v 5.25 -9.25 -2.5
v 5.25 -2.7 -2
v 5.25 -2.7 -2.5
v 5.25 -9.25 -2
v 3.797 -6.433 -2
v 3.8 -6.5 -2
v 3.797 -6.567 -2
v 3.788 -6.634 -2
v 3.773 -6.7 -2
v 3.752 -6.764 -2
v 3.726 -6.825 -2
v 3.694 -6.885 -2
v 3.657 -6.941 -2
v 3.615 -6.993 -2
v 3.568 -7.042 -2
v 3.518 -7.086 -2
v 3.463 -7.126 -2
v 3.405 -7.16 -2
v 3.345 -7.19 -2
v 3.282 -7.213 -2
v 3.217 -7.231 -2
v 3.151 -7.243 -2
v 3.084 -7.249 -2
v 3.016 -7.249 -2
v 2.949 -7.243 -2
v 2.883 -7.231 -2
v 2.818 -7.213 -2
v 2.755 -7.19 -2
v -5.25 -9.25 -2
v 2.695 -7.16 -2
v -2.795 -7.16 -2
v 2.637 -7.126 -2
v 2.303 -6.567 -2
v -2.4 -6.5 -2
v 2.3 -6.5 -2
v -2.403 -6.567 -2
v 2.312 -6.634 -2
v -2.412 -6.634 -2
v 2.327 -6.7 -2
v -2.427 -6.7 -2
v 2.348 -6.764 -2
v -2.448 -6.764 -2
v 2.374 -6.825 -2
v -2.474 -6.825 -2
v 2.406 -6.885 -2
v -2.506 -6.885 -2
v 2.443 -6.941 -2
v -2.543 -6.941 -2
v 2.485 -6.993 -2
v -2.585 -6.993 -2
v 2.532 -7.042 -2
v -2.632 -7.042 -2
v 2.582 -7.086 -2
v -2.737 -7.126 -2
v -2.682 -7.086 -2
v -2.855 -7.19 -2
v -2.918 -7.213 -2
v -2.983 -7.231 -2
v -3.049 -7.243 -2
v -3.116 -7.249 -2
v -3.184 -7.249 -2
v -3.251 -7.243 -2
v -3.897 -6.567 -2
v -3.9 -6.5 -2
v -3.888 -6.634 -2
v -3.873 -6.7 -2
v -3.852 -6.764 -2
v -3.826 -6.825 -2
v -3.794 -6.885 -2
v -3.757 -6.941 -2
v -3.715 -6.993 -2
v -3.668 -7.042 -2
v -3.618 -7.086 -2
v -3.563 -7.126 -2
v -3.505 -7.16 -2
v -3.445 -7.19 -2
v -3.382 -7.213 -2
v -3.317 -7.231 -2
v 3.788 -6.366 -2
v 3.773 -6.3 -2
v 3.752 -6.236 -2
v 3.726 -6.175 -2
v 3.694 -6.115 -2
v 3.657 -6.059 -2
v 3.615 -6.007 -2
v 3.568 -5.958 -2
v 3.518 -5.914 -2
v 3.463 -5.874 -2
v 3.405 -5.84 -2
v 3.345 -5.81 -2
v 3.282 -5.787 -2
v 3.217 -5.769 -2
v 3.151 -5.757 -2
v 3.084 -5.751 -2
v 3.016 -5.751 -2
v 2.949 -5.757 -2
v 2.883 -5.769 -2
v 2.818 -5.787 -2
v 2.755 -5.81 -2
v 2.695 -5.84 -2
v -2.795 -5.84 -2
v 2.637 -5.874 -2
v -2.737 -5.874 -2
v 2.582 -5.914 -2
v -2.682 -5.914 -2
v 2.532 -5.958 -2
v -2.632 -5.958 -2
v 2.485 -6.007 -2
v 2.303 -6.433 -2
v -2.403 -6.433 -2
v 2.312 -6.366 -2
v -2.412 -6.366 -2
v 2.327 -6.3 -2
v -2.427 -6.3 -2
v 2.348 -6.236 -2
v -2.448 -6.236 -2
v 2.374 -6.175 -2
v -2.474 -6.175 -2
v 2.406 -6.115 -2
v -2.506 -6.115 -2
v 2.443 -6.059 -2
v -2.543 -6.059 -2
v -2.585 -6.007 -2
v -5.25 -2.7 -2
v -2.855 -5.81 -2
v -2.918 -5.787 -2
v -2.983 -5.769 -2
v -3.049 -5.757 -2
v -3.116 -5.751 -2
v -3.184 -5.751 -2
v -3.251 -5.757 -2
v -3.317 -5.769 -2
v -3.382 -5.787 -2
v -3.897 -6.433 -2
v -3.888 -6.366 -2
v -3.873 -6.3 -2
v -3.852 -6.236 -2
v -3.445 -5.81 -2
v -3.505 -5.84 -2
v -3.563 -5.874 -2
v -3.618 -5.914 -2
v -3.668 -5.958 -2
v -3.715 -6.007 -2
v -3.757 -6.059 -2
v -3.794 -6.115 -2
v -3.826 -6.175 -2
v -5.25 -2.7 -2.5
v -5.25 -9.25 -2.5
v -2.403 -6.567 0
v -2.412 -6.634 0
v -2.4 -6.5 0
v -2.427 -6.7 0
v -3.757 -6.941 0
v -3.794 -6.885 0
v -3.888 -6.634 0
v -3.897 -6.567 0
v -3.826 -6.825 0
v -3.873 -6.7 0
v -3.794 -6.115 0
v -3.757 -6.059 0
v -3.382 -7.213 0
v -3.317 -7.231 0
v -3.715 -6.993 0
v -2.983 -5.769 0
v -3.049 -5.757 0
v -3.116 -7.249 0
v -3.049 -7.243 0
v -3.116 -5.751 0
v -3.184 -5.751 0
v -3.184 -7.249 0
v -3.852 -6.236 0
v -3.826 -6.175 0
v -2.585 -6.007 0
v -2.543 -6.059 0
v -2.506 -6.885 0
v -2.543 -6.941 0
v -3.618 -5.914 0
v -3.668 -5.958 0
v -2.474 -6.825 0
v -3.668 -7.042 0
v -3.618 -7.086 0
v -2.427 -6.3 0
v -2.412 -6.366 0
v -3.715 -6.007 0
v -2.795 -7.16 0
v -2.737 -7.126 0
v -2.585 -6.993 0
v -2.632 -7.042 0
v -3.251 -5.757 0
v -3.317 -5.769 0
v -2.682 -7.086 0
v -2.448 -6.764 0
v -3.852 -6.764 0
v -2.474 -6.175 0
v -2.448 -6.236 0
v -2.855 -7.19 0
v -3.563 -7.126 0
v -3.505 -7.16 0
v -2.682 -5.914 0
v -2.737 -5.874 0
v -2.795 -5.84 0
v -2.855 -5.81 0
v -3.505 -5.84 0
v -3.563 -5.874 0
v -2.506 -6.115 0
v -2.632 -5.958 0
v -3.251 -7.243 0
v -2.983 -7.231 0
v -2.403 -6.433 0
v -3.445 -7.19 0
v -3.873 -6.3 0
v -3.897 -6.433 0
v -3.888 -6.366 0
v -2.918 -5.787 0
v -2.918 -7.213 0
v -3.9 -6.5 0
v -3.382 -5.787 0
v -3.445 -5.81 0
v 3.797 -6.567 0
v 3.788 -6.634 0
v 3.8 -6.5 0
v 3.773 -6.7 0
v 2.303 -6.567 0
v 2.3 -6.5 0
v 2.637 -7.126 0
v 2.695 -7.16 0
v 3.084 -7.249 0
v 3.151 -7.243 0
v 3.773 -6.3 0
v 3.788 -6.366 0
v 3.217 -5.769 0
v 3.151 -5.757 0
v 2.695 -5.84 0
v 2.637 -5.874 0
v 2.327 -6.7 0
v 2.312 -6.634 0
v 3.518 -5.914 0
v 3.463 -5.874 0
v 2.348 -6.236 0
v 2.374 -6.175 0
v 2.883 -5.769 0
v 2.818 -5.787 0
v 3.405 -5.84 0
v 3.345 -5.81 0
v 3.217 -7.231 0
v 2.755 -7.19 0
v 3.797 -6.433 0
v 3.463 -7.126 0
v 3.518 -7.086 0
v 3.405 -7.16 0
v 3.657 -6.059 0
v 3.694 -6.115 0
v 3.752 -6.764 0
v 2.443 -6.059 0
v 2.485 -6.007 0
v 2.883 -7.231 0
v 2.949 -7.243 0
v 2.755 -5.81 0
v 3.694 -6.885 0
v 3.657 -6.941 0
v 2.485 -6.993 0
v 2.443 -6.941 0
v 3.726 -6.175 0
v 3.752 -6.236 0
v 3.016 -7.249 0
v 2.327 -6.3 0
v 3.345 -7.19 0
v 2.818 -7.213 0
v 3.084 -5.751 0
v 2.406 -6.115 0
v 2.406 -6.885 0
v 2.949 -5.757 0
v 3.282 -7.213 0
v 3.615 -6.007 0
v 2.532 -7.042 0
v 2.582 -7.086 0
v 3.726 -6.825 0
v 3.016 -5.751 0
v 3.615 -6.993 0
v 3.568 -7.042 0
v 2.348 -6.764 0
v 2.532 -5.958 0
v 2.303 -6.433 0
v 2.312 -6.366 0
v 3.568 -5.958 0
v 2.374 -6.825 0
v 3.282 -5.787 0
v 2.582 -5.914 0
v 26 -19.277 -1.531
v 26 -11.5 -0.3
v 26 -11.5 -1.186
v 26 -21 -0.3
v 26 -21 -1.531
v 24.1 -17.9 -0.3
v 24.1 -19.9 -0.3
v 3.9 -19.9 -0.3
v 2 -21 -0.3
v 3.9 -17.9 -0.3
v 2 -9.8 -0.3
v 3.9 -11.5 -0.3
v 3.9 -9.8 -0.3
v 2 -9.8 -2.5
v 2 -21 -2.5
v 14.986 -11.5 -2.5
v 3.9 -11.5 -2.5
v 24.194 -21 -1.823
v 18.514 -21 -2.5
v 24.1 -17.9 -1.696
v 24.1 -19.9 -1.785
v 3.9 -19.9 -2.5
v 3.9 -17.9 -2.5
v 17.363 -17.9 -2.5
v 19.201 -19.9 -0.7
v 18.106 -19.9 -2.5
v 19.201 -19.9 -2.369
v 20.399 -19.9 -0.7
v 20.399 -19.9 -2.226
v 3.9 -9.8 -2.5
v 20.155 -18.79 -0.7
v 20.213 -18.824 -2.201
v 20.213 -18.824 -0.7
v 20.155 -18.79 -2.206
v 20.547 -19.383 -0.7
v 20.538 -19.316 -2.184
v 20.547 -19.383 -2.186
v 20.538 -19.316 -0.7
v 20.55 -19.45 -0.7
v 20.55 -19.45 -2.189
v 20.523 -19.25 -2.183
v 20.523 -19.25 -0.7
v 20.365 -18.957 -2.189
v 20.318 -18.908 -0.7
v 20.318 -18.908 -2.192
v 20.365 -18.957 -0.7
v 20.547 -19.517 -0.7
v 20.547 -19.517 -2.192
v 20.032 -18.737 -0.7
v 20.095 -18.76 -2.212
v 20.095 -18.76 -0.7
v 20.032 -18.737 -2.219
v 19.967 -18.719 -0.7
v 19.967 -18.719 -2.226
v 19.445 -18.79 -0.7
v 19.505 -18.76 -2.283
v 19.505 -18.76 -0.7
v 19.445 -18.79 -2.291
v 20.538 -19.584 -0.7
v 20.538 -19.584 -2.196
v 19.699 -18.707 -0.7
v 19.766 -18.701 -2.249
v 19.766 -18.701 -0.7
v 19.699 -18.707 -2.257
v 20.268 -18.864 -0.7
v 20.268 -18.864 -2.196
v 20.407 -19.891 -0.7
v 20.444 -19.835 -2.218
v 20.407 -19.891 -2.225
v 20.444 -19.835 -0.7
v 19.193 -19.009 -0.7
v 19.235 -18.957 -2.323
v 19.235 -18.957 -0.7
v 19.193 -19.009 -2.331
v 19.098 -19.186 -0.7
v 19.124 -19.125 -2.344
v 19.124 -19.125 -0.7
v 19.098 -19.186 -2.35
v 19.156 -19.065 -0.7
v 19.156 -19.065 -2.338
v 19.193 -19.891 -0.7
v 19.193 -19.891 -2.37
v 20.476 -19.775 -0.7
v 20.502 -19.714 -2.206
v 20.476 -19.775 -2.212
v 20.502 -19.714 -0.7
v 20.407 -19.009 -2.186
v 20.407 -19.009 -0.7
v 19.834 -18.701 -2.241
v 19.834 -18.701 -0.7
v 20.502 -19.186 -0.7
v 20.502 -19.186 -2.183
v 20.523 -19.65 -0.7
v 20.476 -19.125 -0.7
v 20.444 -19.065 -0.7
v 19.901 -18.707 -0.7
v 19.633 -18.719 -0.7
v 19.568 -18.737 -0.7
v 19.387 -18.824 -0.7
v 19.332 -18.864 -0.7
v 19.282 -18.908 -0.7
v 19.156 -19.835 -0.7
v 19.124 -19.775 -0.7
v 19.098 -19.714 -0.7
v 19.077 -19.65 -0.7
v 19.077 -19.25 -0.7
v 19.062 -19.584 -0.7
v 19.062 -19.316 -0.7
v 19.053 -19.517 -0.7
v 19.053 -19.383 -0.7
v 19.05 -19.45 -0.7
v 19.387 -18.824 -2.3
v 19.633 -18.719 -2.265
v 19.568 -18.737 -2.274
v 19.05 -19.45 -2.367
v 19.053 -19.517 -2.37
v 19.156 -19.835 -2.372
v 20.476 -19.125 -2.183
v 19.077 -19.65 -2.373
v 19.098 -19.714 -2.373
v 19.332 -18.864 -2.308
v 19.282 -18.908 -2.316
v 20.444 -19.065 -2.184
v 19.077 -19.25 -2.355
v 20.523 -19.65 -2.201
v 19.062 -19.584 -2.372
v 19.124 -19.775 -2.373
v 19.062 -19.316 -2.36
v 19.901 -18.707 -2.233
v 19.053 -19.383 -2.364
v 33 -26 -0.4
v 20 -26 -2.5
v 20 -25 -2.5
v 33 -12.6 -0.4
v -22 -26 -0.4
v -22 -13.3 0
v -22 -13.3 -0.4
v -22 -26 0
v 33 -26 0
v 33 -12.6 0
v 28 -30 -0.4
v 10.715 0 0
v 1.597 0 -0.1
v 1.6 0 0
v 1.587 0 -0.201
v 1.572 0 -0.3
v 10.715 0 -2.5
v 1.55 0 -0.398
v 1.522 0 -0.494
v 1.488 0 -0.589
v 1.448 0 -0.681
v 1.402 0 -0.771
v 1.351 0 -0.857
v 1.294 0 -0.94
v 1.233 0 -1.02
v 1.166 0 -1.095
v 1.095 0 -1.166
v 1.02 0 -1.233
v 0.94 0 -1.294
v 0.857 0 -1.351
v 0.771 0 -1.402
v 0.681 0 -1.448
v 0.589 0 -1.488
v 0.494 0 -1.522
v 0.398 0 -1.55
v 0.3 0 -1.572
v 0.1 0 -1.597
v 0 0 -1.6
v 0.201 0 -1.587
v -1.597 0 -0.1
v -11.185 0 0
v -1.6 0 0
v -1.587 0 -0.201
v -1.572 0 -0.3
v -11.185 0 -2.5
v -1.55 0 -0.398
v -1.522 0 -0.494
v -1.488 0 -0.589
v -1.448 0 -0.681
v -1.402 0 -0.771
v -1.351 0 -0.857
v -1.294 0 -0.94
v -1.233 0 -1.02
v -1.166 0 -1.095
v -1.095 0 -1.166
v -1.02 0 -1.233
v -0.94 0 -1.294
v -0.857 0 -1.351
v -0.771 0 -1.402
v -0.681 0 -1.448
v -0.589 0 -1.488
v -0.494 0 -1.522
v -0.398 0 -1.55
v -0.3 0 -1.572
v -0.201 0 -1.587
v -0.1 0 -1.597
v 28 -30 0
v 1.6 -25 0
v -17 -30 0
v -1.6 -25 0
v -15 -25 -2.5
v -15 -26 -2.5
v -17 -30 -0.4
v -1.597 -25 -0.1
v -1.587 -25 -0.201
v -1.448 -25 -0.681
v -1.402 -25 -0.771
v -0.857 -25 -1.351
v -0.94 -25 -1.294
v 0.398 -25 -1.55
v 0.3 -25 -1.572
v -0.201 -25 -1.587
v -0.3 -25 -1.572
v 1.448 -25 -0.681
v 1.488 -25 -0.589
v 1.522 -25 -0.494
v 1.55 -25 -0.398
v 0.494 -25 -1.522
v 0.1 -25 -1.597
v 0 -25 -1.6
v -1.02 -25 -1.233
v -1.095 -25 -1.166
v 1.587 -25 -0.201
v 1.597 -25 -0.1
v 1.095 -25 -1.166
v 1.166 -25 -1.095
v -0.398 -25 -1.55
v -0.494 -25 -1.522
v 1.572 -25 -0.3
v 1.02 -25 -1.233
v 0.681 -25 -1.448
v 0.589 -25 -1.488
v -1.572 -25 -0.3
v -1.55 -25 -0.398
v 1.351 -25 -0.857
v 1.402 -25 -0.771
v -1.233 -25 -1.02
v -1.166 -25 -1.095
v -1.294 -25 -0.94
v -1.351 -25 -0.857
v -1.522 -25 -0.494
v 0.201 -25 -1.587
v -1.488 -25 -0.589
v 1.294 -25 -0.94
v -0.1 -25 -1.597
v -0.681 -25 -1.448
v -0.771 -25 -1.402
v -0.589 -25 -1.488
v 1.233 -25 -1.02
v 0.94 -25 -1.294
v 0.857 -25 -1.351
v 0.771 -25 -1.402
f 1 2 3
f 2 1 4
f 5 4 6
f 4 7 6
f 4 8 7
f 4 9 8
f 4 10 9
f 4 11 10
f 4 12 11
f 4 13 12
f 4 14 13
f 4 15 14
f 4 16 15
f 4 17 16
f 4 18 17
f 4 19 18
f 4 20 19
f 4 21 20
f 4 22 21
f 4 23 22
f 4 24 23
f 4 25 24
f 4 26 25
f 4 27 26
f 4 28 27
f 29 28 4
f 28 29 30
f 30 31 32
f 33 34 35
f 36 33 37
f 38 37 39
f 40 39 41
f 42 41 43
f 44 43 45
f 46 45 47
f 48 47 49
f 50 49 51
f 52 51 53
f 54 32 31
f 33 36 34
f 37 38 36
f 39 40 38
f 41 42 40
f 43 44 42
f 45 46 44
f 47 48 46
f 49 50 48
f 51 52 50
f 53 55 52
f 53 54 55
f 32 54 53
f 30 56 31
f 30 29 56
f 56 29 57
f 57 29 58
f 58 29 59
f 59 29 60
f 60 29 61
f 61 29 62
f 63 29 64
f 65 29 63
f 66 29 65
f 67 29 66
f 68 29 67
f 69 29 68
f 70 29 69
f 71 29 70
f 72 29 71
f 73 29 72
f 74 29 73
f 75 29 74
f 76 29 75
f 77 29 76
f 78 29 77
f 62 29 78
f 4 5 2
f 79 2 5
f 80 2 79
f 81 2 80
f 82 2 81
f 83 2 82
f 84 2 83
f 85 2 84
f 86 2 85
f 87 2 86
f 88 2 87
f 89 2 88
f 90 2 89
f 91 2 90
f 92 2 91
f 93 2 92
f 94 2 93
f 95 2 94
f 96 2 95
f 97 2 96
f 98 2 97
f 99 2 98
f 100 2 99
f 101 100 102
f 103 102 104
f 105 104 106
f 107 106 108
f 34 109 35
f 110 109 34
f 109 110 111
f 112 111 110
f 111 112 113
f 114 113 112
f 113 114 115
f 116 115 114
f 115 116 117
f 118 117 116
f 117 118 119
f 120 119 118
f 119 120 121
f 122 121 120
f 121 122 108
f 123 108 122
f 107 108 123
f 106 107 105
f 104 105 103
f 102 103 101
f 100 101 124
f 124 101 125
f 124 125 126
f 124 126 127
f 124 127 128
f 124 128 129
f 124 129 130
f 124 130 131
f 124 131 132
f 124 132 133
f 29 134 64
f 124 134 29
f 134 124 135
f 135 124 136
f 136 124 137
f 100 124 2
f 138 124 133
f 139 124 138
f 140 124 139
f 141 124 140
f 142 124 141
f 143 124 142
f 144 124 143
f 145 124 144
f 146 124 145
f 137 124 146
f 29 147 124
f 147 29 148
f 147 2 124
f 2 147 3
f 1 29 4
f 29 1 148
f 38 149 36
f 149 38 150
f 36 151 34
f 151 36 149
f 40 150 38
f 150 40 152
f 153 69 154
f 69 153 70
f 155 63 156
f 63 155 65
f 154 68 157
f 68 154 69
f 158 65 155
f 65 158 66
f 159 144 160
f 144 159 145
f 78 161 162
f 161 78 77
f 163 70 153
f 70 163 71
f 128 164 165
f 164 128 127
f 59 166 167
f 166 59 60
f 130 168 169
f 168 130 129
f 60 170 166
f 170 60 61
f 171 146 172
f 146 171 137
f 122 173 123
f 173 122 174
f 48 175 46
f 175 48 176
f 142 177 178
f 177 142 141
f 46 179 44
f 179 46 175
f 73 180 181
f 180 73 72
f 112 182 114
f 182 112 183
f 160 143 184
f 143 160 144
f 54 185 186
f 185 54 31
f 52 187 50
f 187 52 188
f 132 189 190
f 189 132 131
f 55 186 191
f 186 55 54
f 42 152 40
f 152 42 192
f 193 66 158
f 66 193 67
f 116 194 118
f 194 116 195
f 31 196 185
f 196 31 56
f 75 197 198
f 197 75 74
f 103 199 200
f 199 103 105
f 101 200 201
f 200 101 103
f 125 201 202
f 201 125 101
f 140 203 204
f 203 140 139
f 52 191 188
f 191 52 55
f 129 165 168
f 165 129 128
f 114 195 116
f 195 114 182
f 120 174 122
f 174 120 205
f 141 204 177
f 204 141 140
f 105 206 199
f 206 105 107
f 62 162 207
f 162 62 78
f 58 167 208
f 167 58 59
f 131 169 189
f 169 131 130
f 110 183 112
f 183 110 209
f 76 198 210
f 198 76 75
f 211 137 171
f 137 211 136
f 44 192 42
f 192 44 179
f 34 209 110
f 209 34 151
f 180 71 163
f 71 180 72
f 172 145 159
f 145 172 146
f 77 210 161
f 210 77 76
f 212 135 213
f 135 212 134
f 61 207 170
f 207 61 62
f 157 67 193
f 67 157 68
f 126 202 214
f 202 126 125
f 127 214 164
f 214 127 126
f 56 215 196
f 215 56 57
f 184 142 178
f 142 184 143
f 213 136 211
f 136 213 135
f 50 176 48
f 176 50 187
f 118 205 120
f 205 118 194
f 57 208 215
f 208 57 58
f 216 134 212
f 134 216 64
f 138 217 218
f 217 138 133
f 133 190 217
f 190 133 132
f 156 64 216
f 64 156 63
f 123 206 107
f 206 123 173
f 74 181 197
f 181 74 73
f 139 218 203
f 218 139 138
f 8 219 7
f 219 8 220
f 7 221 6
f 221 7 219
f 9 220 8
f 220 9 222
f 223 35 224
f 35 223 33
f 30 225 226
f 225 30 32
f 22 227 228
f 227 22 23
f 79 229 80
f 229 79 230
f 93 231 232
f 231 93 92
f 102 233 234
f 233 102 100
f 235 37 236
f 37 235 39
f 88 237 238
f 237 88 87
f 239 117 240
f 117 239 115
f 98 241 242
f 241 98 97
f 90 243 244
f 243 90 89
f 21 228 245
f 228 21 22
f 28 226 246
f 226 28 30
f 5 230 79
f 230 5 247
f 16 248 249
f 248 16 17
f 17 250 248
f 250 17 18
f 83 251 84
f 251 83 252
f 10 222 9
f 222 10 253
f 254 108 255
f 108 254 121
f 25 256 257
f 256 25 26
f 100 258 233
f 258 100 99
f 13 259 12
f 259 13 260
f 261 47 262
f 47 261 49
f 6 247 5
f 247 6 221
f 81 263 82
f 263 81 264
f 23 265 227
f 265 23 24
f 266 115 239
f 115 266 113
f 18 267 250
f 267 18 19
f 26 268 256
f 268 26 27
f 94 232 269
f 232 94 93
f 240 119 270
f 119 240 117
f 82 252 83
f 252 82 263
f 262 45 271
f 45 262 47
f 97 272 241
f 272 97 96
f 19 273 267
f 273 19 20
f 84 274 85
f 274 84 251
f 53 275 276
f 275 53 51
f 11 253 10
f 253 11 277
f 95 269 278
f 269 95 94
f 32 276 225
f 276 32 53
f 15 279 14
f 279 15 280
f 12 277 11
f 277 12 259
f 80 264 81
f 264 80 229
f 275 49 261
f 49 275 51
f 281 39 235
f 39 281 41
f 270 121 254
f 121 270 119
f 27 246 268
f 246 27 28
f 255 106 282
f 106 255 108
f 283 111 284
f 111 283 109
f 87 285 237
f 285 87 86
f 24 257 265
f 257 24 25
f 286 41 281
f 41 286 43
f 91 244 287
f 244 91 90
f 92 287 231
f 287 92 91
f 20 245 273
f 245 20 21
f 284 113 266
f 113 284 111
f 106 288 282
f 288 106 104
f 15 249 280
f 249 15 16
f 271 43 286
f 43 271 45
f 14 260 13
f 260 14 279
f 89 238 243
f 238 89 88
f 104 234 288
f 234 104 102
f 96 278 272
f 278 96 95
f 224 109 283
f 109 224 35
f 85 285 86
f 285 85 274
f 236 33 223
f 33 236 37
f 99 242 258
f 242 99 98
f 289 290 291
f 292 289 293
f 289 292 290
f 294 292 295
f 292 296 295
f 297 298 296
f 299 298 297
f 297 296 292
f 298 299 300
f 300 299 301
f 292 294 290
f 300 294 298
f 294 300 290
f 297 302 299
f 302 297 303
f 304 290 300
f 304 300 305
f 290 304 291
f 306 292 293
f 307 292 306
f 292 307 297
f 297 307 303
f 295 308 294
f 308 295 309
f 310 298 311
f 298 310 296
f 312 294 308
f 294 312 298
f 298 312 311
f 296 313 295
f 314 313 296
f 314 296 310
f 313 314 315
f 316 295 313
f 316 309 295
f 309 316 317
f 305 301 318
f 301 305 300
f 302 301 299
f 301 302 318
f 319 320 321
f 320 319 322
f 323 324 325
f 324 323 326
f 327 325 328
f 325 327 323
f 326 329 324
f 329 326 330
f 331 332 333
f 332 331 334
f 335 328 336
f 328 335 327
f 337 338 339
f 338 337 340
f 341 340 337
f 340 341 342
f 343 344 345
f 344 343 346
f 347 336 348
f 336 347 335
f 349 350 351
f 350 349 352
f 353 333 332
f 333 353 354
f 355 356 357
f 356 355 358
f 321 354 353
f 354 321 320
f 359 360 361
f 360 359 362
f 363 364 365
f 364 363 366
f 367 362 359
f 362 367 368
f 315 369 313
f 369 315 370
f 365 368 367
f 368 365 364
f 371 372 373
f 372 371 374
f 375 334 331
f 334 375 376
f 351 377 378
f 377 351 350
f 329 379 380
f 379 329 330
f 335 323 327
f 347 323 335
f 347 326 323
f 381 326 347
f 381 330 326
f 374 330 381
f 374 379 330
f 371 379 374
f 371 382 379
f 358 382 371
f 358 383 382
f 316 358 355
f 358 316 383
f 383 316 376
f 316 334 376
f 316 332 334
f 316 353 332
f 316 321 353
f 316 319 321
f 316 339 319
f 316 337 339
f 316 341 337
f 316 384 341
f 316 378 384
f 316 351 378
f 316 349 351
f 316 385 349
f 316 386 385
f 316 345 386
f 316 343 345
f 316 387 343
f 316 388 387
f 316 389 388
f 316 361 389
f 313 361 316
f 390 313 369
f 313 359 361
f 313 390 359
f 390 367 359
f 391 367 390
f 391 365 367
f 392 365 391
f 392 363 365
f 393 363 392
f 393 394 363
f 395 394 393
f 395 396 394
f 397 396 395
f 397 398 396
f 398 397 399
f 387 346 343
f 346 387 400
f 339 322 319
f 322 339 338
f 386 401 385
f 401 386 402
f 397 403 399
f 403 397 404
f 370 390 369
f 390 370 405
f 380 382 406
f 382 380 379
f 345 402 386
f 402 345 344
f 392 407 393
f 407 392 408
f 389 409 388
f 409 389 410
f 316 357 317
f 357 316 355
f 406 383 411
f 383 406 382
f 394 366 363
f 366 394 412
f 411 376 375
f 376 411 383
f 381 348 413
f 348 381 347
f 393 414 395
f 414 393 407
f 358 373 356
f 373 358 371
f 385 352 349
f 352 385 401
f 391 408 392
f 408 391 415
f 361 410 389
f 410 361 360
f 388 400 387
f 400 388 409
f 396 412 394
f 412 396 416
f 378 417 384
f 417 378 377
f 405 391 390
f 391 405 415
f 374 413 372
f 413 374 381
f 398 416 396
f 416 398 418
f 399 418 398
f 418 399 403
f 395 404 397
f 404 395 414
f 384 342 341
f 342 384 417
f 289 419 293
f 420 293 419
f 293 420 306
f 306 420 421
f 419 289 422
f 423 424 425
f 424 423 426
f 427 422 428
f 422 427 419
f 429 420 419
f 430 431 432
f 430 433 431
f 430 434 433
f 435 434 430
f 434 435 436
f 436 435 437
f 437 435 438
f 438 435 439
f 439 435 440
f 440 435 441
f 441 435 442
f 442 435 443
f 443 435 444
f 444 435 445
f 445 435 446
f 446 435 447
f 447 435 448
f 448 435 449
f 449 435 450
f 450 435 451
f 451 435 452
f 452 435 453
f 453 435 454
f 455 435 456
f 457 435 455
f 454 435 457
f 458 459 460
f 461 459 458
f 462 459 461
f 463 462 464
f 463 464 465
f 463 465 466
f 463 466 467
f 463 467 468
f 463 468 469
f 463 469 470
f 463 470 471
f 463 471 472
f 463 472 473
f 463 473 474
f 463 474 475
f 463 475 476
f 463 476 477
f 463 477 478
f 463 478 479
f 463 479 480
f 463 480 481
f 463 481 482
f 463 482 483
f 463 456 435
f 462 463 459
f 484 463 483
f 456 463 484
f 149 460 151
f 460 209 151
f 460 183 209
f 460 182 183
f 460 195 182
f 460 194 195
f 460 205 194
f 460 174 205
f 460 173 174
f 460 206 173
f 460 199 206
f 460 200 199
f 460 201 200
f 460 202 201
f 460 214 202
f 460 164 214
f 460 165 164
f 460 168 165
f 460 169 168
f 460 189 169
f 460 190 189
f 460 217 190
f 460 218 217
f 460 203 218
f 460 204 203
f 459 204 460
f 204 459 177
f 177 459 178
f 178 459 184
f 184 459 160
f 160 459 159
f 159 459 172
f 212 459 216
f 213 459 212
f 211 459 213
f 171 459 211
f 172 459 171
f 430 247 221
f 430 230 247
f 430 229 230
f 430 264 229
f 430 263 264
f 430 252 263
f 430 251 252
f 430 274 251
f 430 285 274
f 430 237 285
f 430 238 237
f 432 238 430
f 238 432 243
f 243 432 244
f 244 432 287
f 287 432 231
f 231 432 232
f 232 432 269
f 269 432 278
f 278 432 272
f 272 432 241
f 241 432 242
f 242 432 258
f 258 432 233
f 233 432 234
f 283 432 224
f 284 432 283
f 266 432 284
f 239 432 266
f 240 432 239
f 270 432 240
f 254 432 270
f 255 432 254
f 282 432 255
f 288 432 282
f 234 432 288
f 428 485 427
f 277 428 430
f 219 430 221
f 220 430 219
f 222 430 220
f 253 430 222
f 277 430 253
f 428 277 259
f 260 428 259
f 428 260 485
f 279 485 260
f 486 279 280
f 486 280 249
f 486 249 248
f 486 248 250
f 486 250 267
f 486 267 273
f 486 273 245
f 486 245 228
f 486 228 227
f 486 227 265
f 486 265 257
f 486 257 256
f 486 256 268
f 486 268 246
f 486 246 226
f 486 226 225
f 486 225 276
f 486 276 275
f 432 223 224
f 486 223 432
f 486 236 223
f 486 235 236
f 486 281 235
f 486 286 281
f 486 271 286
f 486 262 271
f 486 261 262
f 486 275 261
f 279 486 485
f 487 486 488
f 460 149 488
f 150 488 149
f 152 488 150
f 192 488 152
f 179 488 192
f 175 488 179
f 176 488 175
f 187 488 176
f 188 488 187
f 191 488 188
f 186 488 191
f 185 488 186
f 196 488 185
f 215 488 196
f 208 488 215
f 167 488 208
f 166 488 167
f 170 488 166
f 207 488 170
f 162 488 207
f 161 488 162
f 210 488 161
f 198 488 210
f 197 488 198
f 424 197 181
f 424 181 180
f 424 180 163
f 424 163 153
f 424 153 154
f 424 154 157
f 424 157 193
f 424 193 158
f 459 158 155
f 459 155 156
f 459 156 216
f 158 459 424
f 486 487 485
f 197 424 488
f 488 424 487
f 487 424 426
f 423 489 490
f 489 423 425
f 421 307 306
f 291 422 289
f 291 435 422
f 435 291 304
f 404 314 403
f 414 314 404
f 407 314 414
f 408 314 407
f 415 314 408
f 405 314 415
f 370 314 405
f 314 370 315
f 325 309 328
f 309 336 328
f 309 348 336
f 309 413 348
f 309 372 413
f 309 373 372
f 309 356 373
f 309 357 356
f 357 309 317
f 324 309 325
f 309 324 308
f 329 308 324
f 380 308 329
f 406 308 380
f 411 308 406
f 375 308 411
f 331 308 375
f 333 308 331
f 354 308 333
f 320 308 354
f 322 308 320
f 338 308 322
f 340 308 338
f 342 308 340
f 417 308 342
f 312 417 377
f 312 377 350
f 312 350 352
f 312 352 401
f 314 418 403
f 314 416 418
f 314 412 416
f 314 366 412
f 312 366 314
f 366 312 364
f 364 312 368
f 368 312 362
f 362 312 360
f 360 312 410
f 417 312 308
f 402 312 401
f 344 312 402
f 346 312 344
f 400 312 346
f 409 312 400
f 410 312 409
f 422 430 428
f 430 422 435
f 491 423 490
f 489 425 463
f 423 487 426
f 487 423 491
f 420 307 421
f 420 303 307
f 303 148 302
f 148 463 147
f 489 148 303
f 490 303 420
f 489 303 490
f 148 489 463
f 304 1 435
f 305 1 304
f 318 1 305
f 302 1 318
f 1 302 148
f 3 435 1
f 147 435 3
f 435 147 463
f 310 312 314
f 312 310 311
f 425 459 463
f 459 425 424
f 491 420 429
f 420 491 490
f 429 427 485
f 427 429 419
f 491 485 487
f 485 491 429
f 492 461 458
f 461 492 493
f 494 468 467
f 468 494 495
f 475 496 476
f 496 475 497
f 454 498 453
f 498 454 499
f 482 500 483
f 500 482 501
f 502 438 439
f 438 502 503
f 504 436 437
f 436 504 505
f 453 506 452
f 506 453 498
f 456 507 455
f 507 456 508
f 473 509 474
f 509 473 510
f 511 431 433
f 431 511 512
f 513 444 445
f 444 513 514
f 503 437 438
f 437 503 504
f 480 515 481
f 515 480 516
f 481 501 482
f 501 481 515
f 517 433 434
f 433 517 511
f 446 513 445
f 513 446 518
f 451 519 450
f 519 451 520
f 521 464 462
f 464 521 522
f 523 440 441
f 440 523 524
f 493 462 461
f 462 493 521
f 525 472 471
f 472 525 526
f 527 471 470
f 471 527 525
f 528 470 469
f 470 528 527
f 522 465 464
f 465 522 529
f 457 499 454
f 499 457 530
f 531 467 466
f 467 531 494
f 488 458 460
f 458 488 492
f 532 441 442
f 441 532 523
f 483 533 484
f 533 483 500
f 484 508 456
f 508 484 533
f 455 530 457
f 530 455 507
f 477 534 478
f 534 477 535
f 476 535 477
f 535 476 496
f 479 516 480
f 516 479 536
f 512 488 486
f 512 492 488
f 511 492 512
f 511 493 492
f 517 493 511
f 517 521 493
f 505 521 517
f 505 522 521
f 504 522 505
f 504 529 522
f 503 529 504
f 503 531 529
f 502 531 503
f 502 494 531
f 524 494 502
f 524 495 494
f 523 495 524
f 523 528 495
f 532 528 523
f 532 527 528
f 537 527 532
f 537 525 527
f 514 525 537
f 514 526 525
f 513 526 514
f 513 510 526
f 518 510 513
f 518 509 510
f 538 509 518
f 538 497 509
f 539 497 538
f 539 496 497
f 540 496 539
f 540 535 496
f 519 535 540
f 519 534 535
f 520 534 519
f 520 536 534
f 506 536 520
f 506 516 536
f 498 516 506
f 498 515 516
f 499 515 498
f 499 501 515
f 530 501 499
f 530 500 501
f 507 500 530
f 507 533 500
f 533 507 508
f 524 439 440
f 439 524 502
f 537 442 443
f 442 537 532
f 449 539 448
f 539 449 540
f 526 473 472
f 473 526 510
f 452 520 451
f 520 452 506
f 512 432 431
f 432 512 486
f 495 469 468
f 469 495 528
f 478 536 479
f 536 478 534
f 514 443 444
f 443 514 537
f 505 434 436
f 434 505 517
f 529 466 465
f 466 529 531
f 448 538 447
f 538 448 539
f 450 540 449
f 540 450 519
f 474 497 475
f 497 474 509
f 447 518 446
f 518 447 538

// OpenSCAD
$fn = 70;
//Servo
    //Servo Case
        servoLength = 23.15;
        servoWidth = 0;
        servoDepth = 12;
    //Servo Arm
        servoArmLength = 10;
        servoArmWidth = 3;
        servoArmThickness = 1;
    //Servo shaft
        servoShaftDiameter = 4;
        servoShaftHeight = 10;
        servoShaftOffset = 4;
        
        servoOffset = 2.5;
        
//PCB
    pcbHeight = 1.5;
    spaceUnderPCB = 2;
//IMU
    imuLength = 20.5;
    imuWidth = 10.5;
    imuHeight = 2;
 
//RadioReciever
    recieverLength = 25;
    recieverWidth = 12;
    recieverHeight = 2;
    
//2.4ghz serial
    serialLength = 18.5;
    serialWidth = 13.5;
    serialHeight = 2;
    
//mount plate
    mountPlateHeight = 9;
    motorArmGapSpace = 0.25;
    
//servoMount
    showServoMount = true;
        
//motor arm
    motorArmThickness = 6;
    motorArmLength = 320;
    
//bladeGear
    bladeGearDiameter = 4.2;
    bladeGearLength = 16.5;
    
    bladeGearFixingRingHeight = 5.5;
    bladeGearFixingRingDiameter = 8.35;
    
//teensyPinHeader
    pinHeaderWidth = 1.6;
    pinHeaderLength = 36;
    pinHeaderHeight = 9.32;
    pinHeaderOffset = 6.2;
    
//rotor
    rotorWidth = 55;
    
//motorMount
    motorDiameter = 13;
    motorMountLength = 30;
    
//bumper
    bumperPosX = servoWidth*0.61;
    bumperPosY = 18;
    showBumper = false;
    
    bumperHole = 3.5;
    
//tsop
    showTsopBottom = false;


/*
module foil(translateY, translateX, x, foilLength) {
    translate([translateX,-translateY,0]) {
        rotate([90,0,0]) {   
            linear_extrude(foilLength) {
                polygon(points=[
                    [	x*	1.00000	,	x*	0.00000	]	,
                    [	x*	0.96407	,	x*	0.00722	]	,
                    [	x*	0.93037	,	x*	0.01391	]	,
                    [	x*	0.89874	,	x*	0.02010	]	,
                    [	x*	0.86902	,	x*	0.02584	]	,
                    [	x*	0.84106	,	x*	0.03114	]	,
                    [	x*	0.81469	,	x*	0.03605	]	,
                    [	x*	0.78977	,	x*	0.04059	]	,
                    [	x*	0.76612	,	x*	0.04480	]	,
                    [	x*	0.74359	,	x*	0.04870	]	,
                    [	x*	0.72202	,	x*	0.05233	]	,
                    [	x*	0.70126	,	x*	0.05572	]	,
                    [	x*	0.68114	,	x*	0.05890	]	,
                    [	x*	0.66150	,	x*	0.06191	]	,
                    [	x*	0.64219	,	x*	0.06476	]	,
                    [	x*	0.62306	,	x*	0.06751	]	,
                    [	x*	0.60393	,	x*	0.07017	]	,
                    [	x*	0.58474	,	x*	0.07277	]	,
                    [	x*	0.56552	,	x*	0.07529	]	,
                    [	x*	0.54632	,	x*	0.07773	]	,
                    [	x*	0.52716	,	x*	0.08008	]	,
                    [	x*	0.50810	,	x*	0.08234	]	,
                    [	x*	0.48917	,	x*	0.08450	]	,
                    [	x*	0.47041	,	x*	0.08654	]	,
                    [	x*	0.45186	,	x*	0.08847	]	,
                    [	x*	0.43357	,	x*	0.09028	]	,
                    [	x*	0.41557	,	x*	0.09196	]	,
                    [	x*	0.39790	,	x*	0.09350	]	,
                    [	x*	0.38060	,	x*	0.09489	]	,
                    [	x*	0.36371	,	x*	0.09613	]	,
                    [	x*	0.34728	,	x*	0.09721	]	,
                    [	x*	0.33135	,	x*	0.09813	]	,
                    [	x*	0.31594	,	x*	0.09887	]	,
                    [	x*	0.30106	,	x*	0.09944	]	,
                    [	x*	0.28671	,	x*	0.09984	]	,
                    [	x*	0.27287	,	x*	0.10007	]	,
                    [	x*	0.25952	,	x*	0.10015	]	,
                    [	x*	0.24667	,	x*	0.10006	]	,
                    [	x*	0.23430	,	x*	0.09982	]	,
                    [	x*	0.22239	,	x*	0.09944	]	,
                    [	x*	0.21094	,	x*	0.09890	]	,
                    [	x*	0.19994	,	x*	0.09822	]	,
                    [	x*	0.18937	,	x*	0.09740	]	,
                    [	x*	0.17922	,	x*	0.09645	]	,
                    [	x*	0.16949	,	x*	0.09536	]	,
                    [	x*	0.16016	,	x*	0.09415	]	,
                    [	x*	0.15122	,	x*	0.09280	]	,
                    [	x*	0.14266	,	x*	0.09134	]	,
                    [	x*	0.13447	,	x*	0.08976	]	,
                    [	x*	0.12664	,	x*	0.08806	]	,
                    [	x*	0.11914	,	x*	0.08625	]	,
                    [	x*	0.11197	,	x*	0.08432	]	,
                    [	x*	0.10511	,	x*	0.08227	]	,
                    [	x*	0.09854	,	x*	0.08011	]	,
                    [	x*	0.09226	,	x*	0.07783	]	,
                    [	x*	0.08624	,	x*	0.07544	]	,
                    [	x*	0.08047	,	x*	0.07293	]	,
                    [	x*	0.07494	,	x*	0.07032	]	,
                    [	x*	0.06963	,	x*	0.06759	]	,
                    [	x*	0.06452	,	x*	0.06475	]	,
                    [	x*	0.05961	,	x*	0.06180	]	,
                    [	x*	0.05487	,	x*	0.05874	]	,
                    [	x*	0.05030	,	x*	0.05556	]	,
                    [	x*	0.04588	,	x*	0.05229	]	,
                    [	x*	0.04160	,	x*	0.04891	]	,
                    [	x*	0.03747	,	x*	0.04545	]	,
                    [	x*	0.03350	,	x*	0.04192	]	,
                    [	x*	0.02969	,	x*	0.03834	]	,
                    [	x*	0.02605	,	x*	0.03472	]	,
                    [	x*	0.02258	,	x*	0.03109	]	,
                    [	x*	0.01929	,	x*	0.02745	]	,
                    [	x*	0.01618	,	x*	0.02382	]	,
                    [	x*	0.01326	,	x*	0.02021	]	,
                    [	x*	0.01053	,	x*	0.01665	]	,
                    [	x*	0.00800	,	x*	0.01315	]	,
                    [	x*	0.00568	,	x*	0.00972	]	,
                    [	x*	0.00357	,	x*	0.00638	]	,
                    [	x*	0.00167	,	x*	0.00314	]	,
                    [	x*	0.00000	,	x*	0.00003	]	
                ]);
            }
        }
    }
}
difference() {
    translate([-(rotorWidth*0.40),-servoWidth,0]) {
        translate([0,6.34303,0]) {
            hull() {
                foil(	1000*	0.00634303	,	1000*	0.010813	,	1000*	0.0219	    ,	100*	0.00761164	);
                foil(	1000*	0.00761164	,	1000*	0.009675	,	1000*	0.0243	    ,	100*	0.00888024	);
                foil(	1000*	0.00888024	,	1000*	0.0086	    ,	1000*	0.0272	    ,	100*	0.0101488	);
                foil(	1000*	0.0101488	,	1000*	0.0076	    ,	1000*	0.0301	    ,	100*	0.0152233	);
                foil(	1000*	0.0152233	,	1000*	0.00355	    ,	1000*	0.0445	    ,	100*	0.0164919	);
                foil(	1000*	0.0164919	,	1000*	0.002533	,	1000*	0.04832	    ,	100*	0.0177605	);
                foil(	1000*	0.0177605	,	1000*	0.001475	,	1000*	0.0516	    ,	100*	0.0190291	);
                foil(	1000*	0.0190291	,	1000*	0.0005	    ,	1000*	0.053937	,	100*	0.0202977	);
                foil(	1000*	0.0202977	,	1000*	0	        ,	1000*	0.055	    ,	100*	0.224019	);
                foil(	1000*	0.224019	,	1000*	0	        ,	1000*	0.055	    ,	100*	0.227571	);
                foil(	1000*	0.227571	,	1000*	0.0008	    ,	1000*	0.0542	    ,	100*	0.232138	);
                foil(	1000*	0.232138	,	1000*	0.003	    ,	1000*	0.052	    ,	100*	0.23569	    );
                foil(	1000*	0.23569	    ,	1000*	0.006	    ,	1000*	0.049	    ,	100*	0.238227	);
                foil(	1000*	0.238227	,	1000*	0.01	    ,	1000*	0.0445	    ,	100*	0.241272	);
                foil(	1000*	0.241272	,	1000*	0.015	    ,  	1000*	0.039	    ,	100*	0.244114	);
                foil(	1000*	0.244114	,	1000*	0.021	    ,	1000*	0.032	    ,	100*	0.247564	);
                foil(	1000*	0.247564	,	1000*	0.0305	    ,	1000*	0.0205	    ,	100*	0.249239	);
                foil(	1000*	0.249239	,	1000*	0.03725	    ,	1000*	0.0117	    ,	100*	0.25	    );
                foil(	1000*	0.25	    ,	1000*	0.044	    ,	1000*	0.003	    ,	100*	0.248	    );
            }
        }
    }
    rotate([0,0,180]) {
        translate([0,0,0]) {
            translate([0,servoWidth-2,0]) {
                translate([0,27,0]) {
                    rotate([90,0,0]) {
                       cylinder(h = 40, d = 3.1, $fn=100);
                    }
                }
            }
        }
    }
}
*/

    difference() {
        hull() {
            translate([-11.185,-1,-2.5]) {
                cube([21.9,1,2.5]);
            }
            translate([-15,-26,-2.5]) {
                cube([35,1,2.5]);
            }

            translate([-22,-14.3,-0.4]) {
                cube([1,1,0.4]);
            }

            translate([-22,-26,-0.4]) {
                cube([1,1,0.4]);
            }

            translate([32,-26,-0.4]) {
                cube([1,1,0.4]);
            }

            translate([32,-13.6,-0.4]) {
                cube([1,1,0.4]);
            }

            translate([27,-30,-0.4]) {
                cube([1,1,0.4]);
            }

            translate([-17,-30,-0.4]) {
                cube([1,1,0.4]);
            }
        }

        translate([-5,-3,-2]) {
            rotate([0,180,180]) {
               // difference() {
                    translate([-0.25,1,0]) {
                        cube([10.5,5.25,1]);
                    }
                    translate([1.85,3.5,-4]) {
                        cylinder(d = 1.5, h = 6);
                    }
                    translate([8.05,3.5,-4]) {
                        cylinder(d = 1.5, h = 6);
                    }
              //  }

                difference() {
                    //hull() {
                        translate([-0.25,-0.3,0]) {
                            cube([10.5,1.3,2]);
                        }
                        translate([10+2.3,0,6]) {
                            cube([0.9,1,5.3]);
                        }
                   // }
                    translate([0,1.1,14.5]) {
                        rotate([90,0,0]) {
                            cylinder(d = 25, h = 1.5);
                        }
                    }
                }

                translate([10+3.22,1,11.1]) {
                    rotate([90,0,0]) {
                        cylinder(d = 2.39, h = 1);
                    }
                }

                translate([10+2.3,0,6]) {
                    cube([2.1,1,5.3]);
                }
            }
        }



        translate([2,-21,-5]) {
            difference() {
                translate([0.9,5.4875,2.35]) {
                    rotate([90,0,90]) {
                        //cylinder(d=4.5, h=22.2);
                    }
                }
                translate([2,4.75,2.35]) {
                    rotate([90,0,90]) {
                        //cylinder(d = 2.6, h = 24);
                    }
                }
            }

            difference() {
                cube([24,9.5,4.7]);
                translate([1.9,1.1,0]) {
                    #cube([20.2,2,4.7]);
                }
                translate([2,4.75,2.35]) {
                    rotate([90,0,90]) {
                       // cylinder(d = 2.6, h = 24);
                    }
                }
                
            }

            translate([0,9.5,0]) {
                    cube([1.9,1.7,4.7]);
                }

            //difference() {
                translate([14,0,-0.9]) {
                    cube([8,3.2,0.9]);
                }
                translate([17.8,1.55,2.3]) {
                    cylinder(d = 1.5, h = 2);
                }
            //}
        }
        
        //translate([-(rotorWidth*0.40),-servoWidth,0]) {
            rotate([0,0,180]) {
                translate([0,0,0]) {
                    translate([0,servoWidth-2,0]) {
                        translate([0,27,0]) {
                            rotate([90,0,0]) {
                               cylinder(h = 40, d = 3.2, $fn=100);
                            }
                        }
                    }
                }
            }
        //}
    }
